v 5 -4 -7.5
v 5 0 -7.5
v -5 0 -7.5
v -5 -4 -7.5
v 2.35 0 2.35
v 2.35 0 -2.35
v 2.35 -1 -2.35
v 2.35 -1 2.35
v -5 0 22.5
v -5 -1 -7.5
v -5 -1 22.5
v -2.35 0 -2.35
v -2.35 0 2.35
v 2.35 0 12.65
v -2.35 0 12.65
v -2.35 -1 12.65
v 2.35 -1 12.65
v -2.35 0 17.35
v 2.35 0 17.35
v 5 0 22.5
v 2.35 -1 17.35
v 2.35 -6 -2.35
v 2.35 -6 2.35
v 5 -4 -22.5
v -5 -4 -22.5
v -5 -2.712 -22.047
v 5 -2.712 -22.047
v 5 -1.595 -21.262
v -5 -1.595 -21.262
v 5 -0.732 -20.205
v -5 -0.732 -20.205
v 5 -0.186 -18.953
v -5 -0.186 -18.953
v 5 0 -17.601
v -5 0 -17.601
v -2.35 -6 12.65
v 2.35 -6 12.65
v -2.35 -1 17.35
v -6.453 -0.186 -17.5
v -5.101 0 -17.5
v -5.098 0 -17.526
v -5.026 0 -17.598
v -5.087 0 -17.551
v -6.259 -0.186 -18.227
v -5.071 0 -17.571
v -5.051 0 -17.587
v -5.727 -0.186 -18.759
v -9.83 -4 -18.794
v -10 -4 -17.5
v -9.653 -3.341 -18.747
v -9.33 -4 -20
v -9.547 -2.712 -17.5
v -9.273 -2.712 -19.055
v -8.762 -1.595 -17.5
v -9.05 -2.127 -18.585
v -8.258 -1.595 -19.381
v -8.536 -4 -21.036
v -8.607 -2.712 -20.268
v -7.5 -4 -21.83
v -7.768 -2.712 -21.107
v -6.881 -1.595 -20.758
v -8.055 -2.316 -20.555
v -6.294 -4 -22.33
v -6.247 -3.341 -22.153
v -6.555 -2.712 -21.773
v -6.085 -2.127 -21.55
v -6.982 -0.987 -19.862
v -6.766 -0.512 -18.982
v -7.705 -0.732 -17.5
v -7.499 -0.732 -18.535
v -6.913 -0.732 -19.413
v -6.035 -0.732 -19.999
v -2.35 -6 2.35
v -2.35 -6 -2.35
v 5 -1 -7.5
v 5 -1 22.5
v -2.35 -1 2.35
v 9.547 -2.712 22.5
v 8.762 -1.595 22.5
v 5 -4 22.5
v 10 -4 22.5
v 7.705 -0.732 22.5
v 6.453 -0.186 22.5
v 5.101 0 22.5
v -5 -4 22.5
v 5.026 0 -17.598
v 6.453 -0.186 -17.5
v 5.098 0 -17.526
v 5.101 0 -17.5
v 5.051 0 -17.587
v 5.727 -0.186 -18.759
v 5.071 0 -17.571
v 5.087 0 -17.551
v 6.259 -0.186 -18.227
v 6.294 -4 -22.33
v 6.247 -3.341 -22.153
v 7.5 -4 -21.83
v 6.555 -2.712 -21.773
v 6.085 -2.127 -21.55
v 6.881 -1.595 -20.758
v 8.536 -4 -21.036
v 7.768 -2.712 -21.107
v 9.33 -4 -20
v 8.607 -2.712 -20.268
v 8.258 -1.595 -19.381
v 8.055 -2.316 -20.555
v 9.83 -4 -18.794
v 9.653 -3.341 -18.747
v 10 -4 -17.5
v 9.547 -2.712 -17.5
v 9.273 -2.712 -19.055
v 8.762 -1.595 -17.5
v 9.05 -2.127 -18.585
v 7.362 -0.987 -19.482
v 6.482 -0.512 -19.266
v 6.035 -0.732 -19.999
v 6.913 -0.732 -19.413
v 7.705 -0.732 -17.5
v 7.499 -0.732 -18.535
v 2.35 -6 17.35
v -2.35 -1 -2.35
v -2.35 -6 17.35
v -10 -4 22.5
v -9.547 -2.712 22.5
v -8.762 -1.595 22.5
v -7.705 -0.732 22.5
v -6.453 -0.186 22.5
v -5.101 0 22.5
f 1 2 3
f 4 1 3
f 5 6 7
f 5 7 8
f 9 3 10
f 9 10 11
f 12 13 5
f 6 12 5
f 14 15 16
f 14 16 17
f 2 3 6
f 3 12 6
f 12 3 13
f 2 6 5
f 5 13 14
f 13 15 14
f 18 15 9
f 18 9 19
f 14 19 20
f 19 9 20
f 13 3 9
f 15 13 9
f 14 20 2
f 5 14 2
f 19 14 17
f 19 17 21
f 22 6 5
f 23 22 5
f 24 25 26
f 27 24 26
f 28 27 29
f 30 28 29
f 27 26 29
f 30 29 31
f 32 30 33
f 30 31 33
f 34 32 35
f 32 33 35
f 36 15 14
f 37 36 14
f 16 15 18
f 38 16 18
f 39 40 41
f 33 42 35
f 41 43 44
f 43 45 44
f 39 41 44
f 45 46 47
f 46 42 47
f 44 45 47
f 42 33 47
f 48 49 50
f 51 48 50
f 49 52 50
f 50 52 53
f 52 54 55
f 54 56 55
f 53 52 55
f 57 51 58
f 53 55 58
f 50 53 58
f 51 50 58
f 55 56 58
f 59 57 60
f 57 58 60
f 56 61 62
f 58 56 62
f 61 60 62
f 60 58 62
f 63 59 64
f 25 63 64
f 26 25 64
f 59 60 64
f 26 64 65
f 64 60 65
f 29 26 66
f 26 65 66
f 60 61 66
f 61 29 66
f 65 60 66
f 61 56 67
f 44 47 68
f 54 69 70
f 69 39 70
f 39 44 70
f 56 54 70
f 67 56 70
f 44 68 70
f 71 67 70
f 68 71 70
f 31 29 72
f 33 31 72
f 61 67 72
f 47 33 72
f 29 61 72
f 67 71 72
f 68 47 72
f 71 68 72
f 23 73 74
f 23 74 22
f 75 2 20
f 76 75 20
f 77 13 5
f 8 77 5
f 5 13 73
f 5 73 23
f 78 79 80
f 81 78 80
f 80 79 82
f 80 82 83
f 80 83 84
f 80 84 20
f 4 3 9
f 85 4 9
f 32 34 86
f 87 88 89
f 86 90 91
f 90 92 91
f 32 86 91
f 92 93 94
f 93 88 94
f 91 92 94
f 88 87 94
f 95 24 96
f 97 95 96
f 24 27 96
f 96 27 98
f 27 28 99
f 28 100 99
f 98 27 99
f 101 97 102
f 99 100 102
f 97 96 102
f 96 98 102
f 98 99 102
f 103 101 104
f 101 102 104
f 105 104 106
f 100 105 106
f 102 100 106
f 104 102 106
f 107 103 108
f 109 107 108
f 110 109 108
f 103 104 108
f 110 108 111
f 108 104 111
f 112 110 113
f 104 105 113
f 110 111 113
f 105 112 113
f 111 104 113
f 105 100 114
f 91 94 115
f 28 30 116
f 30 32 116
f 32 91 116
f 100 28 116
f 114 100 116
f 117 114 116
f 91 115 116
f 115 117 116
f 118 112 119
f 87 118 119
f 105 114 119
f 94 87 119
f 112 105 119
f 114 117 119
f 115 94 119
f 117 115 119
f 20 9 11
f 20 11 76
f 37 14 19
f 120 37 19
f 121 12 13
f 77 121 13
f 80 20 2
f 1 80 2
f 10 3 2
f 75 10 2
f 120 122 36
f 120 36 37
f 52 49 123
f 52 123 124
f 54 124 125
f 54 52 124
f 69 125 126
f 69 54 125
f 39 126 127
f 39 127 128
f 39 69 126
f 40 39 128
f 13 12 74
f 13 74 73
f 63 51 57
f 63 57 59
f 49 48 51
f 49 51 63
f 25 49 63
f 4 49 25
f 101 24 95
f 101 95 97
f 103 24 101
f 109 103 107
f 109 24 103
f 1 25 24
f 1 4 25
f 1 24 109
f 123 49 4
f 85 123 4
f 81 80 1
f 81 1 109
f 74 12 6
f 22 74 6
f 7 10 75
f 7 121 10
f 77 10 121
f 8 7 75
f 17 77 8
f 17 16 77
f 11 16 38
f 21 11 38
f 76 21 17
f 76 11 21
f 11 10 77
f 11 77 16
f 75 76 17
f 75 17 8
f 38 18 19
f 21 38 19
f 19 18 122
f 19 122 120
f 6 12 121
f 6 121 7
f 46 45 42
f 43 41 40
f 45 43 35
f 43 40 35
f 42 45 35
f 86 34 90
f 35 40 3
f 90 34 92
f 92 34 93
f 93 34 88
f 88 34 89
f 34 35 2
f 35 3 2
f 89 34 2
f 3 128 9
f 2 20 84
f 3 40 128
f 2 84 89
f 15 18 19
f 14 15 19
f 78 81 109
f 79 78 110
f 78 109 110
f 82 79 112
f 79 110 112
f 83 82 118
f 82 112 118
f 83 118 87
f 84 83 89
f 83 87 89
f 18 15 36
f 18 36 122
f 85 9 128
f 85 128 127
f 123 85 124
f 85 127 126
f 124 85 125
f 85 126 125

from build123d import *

# Parameters (mm, degrees)
F1_DEPTH    = 4
F2_T1_DEPTH = 52.2474487139
F2_T3_DEPTH = 10
F2_T6_ANGLE = 90
F2_T8_ANGLE = 90
F0_W        = 4.7
F0_H        = 4.7
F3_DEPTH    = 6
F0_W_2      = 10
F0_H_2      = 30
F4_DEPTH    = 1


# Not quite as in the source:
# - a fillet or chamfer that OpenCascade refuses, or shapes differently, is made with other operations: its cross-section is extruded or revolved along the edge and cut away or added


with BuildPart() as f1:
    # F0 (on Front) → F1 (new body)
    with BuildSketch(Plane.XZ):
        with BuildLine():
            ThreePointArc((-10, -17.5), (-8.5355339059, -21.0355339059), (-5, -22.5))
            Line((-5, -22.5), (5, -22.5))
            ThreePointArc((5, -22.5), (8.5355339059, -21.0355339059), (10, -17.5))
            Line((10, -17.5), (10, 22.5))
            Line((10, 22.5), (5, 22.5))
            Line((5, 22.5), (5, -7.5))
            Line((5, -7.5), (-5, -7.5))
            Line((-5, -7.5), (-5, 22.5))
            Line((-5, 22.5), (-10, 22.5))
            Line((-10, 22.5), (-10, -17.5))
        make_face()
    extrude(amount=F1_DEPTH)

    # F2: fillet of radius 5 on 1 edges, made by hand

    # F2_s2 → F2_t1 (cut)
    with BuildSketch(Plane.XY.offset(-17.5)):
        with BuildLine():
            ThreePointArc((10, -4), (8.2632981746, -1.1270166538), (5.1010205144, 0))
            Line((5.1010205144, 0), (10, 0))
            Line((10, 0), (10, -4))
        make_face()
        with BuildLine():
            ThreePointArc((-10, -4), (-8.2632981746, -1.1270166538), (-5.1010205144, 0))
            Line((-5.1010205144, 0), (-10, 0))
            Line((-10, 0), (-10, -4))
        make_face()
    extrude(amount=F2_T1_DEPTH, mode=Mode.SUBTRACT)

    # F2_s4 → F2_t3 (cut)
    with BuildSketch(Plane.YZ.offset(-5)):
        with BuildLine():
            ThreePointArc((-4, -22.5), (-1.1270166538, -20.7632981746), (0, -17.6010205144))
            Line((0, -17.6010205144), (0, -22.5))
            Line((0, -22.5), (-4, -22.5))
        make_face()
    extrude(amount=F2_T3_DEPTH, mode=Mode.SUBTRACT)

    # F2_s5 → F2_t6 (revolve, cut)
    with BuildSketch(Plane.YZ.offset(5)):
        with BuildLine():
            ThreePointArc((-4, -22.5), (-1.1270166538, -20.7632981746), (0, -17.6010205144))
            Line((0, -17.6010205144), (0, -22.5))
            Line((0, -22.5), (-4, -22.5))
        make_face()
    revolve(axis=Axis((5, 0, -17.5), (0, -1, 0)), revolution_arc=F2_T6_ANGLE, mode=Mode.SUBTRACT)

    # F2_s7 → F2_t8 (revolve, cut)
    with BuildSketch(Plane.XY.offset(-17.5)):
        with BuildLine():
            ThreePointArc((-10, -4), (-8.2632981746, -1.1270166538), (-5.1010205144, 0))
            Line((-5.1010205144, 0), (-10, 0))
            Line((-10, 0), (-10, -4))
        make_face()
    revolve(axis=Axis((-5, 0, -17.5), (0, -1, 0)), revolution_arc=F2_T8_ANGLE, mode=Mode.SUBTRACT)


with BuildPart() as f3:
    # F0 (on Front) → F3 (new body)
    with BuildSketch(Plane.XZ):
        Rectangle(F0_W, F0_H)
    extrude(amount=F3_DEPTH)


with BuildPart() as f3b:
    # F0 (on Front) → F3, piece 2 (new body)
    with BuildSketch(Plane.XZ):
        with Locations((0, 15)):
            Rectangle(F0_W, F0_H)
    extrude(amount=F3_DEPTH)


with BuildPart() as f4:
    # F0 (on Front) → F4 (new body)
    with BuildSketch(Plane.XZ):
        with Locations((0, 7.5)):
            Rectangle(F0_W_2, F0_H_2)
        Rectangle(F0_W, F0_H, mode=Mode.SUBTRACT)
        with Locations((0, 15)):
            Rectangle(F0_W, F0_H, mode=Mode.SUBTRACT)
    extrude(amount=F4_DEPTH)


solid = Compound([f1.part, f3.part, f3b.part, f4.part])
